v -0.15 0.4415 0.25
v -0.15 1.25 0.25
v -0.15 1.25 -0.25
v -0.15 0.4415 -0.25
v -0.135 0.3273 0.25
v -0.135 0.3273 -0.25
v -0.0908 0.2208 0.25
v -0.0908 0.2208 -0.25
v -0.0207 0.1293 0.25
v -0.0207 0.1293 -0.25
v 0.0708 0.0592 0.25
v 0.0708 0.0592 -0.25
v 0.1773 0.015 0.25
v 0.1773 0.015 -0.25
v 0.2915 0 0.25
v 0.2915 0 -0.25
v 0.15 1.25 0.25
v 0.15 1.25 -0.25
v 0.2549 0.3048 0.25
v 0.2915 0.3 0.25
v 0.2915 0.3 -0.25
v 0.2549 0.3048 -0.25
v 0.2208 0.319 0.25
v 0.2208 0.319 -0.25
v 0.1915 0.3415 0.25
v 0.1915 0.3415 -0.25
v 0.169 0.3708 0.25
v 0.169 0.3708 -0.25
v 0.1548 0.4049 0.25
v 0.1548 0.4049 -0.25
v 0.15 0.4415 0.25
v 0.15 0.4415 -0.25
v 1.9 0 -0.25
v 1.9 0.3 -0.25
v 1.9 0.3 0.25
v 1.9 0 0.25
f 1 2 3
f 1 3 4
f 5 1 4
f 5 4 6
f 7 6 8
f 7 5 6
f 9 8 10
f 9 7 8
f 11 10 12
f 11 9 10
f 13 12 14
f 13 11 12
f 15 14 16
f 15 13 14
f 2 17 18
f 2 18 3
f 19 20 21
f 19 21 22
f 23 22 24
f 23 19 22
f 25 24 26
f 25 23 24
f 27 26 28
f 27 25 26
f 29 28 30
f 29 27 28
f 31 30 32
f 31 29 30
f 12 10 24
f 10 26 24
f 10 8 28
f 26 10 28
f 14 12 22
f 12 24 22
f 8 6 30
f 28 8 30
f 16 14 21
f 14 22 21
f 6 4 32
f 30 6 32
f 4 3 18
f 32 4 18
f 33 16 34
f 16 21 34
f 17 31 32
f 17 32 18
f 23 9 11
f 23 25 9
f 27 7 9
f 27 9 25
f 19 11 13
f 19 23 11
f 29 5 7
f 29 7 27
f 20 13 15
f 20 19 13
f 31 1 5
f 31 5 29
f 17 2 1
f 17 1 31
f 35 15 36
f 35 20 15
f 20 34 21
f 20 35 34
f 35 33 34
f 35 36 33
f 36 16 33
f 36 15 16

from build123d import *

# Parameters (mm, degrees)
SALIENTE_EXTRUIR1_DEPTH      = 0.25
SALIENTE_EXTRUIR1_DEPTH_BACK = 0.25


with BuildPart() as part:
    # Croquis1 → Saliente-Extruir1 (new body, two sides)
    with BuildSketch(Plane.XY) as saliente_extruir1_sk:
        with BuildLine():
            Line((1.9, 0.3), (0.291547595, 0.3))
            ThreePointArc((0.291547595, 0.3), (0.191458331, 0.341458331), (0.15, 0.441547595))
            Line((0.15, 0.441547595), (0.15, 1.25))
            Line((0.15, 1.25), (-0.15, 1.25))
            Line((-0.15, 1.25), (-0.15, 0.441547595))
            ThreePointArc((-0.15, 0.441547595), (-0.020673704, 0.129326296), (0.291547595, 0))
            Line((0.291547595, 0), (1.9, 0))
            Line((1.9, 0), (1.9, 0.3))
        make_face()
    extrude(amount=SALIENTE_EXTRUIR1_DEPTH)
    extrude(saliente_extruir1_sk.sketch, amount=-SALIENTE_EXTRUIR1_DEPTH_BACK)


solid = part.part
